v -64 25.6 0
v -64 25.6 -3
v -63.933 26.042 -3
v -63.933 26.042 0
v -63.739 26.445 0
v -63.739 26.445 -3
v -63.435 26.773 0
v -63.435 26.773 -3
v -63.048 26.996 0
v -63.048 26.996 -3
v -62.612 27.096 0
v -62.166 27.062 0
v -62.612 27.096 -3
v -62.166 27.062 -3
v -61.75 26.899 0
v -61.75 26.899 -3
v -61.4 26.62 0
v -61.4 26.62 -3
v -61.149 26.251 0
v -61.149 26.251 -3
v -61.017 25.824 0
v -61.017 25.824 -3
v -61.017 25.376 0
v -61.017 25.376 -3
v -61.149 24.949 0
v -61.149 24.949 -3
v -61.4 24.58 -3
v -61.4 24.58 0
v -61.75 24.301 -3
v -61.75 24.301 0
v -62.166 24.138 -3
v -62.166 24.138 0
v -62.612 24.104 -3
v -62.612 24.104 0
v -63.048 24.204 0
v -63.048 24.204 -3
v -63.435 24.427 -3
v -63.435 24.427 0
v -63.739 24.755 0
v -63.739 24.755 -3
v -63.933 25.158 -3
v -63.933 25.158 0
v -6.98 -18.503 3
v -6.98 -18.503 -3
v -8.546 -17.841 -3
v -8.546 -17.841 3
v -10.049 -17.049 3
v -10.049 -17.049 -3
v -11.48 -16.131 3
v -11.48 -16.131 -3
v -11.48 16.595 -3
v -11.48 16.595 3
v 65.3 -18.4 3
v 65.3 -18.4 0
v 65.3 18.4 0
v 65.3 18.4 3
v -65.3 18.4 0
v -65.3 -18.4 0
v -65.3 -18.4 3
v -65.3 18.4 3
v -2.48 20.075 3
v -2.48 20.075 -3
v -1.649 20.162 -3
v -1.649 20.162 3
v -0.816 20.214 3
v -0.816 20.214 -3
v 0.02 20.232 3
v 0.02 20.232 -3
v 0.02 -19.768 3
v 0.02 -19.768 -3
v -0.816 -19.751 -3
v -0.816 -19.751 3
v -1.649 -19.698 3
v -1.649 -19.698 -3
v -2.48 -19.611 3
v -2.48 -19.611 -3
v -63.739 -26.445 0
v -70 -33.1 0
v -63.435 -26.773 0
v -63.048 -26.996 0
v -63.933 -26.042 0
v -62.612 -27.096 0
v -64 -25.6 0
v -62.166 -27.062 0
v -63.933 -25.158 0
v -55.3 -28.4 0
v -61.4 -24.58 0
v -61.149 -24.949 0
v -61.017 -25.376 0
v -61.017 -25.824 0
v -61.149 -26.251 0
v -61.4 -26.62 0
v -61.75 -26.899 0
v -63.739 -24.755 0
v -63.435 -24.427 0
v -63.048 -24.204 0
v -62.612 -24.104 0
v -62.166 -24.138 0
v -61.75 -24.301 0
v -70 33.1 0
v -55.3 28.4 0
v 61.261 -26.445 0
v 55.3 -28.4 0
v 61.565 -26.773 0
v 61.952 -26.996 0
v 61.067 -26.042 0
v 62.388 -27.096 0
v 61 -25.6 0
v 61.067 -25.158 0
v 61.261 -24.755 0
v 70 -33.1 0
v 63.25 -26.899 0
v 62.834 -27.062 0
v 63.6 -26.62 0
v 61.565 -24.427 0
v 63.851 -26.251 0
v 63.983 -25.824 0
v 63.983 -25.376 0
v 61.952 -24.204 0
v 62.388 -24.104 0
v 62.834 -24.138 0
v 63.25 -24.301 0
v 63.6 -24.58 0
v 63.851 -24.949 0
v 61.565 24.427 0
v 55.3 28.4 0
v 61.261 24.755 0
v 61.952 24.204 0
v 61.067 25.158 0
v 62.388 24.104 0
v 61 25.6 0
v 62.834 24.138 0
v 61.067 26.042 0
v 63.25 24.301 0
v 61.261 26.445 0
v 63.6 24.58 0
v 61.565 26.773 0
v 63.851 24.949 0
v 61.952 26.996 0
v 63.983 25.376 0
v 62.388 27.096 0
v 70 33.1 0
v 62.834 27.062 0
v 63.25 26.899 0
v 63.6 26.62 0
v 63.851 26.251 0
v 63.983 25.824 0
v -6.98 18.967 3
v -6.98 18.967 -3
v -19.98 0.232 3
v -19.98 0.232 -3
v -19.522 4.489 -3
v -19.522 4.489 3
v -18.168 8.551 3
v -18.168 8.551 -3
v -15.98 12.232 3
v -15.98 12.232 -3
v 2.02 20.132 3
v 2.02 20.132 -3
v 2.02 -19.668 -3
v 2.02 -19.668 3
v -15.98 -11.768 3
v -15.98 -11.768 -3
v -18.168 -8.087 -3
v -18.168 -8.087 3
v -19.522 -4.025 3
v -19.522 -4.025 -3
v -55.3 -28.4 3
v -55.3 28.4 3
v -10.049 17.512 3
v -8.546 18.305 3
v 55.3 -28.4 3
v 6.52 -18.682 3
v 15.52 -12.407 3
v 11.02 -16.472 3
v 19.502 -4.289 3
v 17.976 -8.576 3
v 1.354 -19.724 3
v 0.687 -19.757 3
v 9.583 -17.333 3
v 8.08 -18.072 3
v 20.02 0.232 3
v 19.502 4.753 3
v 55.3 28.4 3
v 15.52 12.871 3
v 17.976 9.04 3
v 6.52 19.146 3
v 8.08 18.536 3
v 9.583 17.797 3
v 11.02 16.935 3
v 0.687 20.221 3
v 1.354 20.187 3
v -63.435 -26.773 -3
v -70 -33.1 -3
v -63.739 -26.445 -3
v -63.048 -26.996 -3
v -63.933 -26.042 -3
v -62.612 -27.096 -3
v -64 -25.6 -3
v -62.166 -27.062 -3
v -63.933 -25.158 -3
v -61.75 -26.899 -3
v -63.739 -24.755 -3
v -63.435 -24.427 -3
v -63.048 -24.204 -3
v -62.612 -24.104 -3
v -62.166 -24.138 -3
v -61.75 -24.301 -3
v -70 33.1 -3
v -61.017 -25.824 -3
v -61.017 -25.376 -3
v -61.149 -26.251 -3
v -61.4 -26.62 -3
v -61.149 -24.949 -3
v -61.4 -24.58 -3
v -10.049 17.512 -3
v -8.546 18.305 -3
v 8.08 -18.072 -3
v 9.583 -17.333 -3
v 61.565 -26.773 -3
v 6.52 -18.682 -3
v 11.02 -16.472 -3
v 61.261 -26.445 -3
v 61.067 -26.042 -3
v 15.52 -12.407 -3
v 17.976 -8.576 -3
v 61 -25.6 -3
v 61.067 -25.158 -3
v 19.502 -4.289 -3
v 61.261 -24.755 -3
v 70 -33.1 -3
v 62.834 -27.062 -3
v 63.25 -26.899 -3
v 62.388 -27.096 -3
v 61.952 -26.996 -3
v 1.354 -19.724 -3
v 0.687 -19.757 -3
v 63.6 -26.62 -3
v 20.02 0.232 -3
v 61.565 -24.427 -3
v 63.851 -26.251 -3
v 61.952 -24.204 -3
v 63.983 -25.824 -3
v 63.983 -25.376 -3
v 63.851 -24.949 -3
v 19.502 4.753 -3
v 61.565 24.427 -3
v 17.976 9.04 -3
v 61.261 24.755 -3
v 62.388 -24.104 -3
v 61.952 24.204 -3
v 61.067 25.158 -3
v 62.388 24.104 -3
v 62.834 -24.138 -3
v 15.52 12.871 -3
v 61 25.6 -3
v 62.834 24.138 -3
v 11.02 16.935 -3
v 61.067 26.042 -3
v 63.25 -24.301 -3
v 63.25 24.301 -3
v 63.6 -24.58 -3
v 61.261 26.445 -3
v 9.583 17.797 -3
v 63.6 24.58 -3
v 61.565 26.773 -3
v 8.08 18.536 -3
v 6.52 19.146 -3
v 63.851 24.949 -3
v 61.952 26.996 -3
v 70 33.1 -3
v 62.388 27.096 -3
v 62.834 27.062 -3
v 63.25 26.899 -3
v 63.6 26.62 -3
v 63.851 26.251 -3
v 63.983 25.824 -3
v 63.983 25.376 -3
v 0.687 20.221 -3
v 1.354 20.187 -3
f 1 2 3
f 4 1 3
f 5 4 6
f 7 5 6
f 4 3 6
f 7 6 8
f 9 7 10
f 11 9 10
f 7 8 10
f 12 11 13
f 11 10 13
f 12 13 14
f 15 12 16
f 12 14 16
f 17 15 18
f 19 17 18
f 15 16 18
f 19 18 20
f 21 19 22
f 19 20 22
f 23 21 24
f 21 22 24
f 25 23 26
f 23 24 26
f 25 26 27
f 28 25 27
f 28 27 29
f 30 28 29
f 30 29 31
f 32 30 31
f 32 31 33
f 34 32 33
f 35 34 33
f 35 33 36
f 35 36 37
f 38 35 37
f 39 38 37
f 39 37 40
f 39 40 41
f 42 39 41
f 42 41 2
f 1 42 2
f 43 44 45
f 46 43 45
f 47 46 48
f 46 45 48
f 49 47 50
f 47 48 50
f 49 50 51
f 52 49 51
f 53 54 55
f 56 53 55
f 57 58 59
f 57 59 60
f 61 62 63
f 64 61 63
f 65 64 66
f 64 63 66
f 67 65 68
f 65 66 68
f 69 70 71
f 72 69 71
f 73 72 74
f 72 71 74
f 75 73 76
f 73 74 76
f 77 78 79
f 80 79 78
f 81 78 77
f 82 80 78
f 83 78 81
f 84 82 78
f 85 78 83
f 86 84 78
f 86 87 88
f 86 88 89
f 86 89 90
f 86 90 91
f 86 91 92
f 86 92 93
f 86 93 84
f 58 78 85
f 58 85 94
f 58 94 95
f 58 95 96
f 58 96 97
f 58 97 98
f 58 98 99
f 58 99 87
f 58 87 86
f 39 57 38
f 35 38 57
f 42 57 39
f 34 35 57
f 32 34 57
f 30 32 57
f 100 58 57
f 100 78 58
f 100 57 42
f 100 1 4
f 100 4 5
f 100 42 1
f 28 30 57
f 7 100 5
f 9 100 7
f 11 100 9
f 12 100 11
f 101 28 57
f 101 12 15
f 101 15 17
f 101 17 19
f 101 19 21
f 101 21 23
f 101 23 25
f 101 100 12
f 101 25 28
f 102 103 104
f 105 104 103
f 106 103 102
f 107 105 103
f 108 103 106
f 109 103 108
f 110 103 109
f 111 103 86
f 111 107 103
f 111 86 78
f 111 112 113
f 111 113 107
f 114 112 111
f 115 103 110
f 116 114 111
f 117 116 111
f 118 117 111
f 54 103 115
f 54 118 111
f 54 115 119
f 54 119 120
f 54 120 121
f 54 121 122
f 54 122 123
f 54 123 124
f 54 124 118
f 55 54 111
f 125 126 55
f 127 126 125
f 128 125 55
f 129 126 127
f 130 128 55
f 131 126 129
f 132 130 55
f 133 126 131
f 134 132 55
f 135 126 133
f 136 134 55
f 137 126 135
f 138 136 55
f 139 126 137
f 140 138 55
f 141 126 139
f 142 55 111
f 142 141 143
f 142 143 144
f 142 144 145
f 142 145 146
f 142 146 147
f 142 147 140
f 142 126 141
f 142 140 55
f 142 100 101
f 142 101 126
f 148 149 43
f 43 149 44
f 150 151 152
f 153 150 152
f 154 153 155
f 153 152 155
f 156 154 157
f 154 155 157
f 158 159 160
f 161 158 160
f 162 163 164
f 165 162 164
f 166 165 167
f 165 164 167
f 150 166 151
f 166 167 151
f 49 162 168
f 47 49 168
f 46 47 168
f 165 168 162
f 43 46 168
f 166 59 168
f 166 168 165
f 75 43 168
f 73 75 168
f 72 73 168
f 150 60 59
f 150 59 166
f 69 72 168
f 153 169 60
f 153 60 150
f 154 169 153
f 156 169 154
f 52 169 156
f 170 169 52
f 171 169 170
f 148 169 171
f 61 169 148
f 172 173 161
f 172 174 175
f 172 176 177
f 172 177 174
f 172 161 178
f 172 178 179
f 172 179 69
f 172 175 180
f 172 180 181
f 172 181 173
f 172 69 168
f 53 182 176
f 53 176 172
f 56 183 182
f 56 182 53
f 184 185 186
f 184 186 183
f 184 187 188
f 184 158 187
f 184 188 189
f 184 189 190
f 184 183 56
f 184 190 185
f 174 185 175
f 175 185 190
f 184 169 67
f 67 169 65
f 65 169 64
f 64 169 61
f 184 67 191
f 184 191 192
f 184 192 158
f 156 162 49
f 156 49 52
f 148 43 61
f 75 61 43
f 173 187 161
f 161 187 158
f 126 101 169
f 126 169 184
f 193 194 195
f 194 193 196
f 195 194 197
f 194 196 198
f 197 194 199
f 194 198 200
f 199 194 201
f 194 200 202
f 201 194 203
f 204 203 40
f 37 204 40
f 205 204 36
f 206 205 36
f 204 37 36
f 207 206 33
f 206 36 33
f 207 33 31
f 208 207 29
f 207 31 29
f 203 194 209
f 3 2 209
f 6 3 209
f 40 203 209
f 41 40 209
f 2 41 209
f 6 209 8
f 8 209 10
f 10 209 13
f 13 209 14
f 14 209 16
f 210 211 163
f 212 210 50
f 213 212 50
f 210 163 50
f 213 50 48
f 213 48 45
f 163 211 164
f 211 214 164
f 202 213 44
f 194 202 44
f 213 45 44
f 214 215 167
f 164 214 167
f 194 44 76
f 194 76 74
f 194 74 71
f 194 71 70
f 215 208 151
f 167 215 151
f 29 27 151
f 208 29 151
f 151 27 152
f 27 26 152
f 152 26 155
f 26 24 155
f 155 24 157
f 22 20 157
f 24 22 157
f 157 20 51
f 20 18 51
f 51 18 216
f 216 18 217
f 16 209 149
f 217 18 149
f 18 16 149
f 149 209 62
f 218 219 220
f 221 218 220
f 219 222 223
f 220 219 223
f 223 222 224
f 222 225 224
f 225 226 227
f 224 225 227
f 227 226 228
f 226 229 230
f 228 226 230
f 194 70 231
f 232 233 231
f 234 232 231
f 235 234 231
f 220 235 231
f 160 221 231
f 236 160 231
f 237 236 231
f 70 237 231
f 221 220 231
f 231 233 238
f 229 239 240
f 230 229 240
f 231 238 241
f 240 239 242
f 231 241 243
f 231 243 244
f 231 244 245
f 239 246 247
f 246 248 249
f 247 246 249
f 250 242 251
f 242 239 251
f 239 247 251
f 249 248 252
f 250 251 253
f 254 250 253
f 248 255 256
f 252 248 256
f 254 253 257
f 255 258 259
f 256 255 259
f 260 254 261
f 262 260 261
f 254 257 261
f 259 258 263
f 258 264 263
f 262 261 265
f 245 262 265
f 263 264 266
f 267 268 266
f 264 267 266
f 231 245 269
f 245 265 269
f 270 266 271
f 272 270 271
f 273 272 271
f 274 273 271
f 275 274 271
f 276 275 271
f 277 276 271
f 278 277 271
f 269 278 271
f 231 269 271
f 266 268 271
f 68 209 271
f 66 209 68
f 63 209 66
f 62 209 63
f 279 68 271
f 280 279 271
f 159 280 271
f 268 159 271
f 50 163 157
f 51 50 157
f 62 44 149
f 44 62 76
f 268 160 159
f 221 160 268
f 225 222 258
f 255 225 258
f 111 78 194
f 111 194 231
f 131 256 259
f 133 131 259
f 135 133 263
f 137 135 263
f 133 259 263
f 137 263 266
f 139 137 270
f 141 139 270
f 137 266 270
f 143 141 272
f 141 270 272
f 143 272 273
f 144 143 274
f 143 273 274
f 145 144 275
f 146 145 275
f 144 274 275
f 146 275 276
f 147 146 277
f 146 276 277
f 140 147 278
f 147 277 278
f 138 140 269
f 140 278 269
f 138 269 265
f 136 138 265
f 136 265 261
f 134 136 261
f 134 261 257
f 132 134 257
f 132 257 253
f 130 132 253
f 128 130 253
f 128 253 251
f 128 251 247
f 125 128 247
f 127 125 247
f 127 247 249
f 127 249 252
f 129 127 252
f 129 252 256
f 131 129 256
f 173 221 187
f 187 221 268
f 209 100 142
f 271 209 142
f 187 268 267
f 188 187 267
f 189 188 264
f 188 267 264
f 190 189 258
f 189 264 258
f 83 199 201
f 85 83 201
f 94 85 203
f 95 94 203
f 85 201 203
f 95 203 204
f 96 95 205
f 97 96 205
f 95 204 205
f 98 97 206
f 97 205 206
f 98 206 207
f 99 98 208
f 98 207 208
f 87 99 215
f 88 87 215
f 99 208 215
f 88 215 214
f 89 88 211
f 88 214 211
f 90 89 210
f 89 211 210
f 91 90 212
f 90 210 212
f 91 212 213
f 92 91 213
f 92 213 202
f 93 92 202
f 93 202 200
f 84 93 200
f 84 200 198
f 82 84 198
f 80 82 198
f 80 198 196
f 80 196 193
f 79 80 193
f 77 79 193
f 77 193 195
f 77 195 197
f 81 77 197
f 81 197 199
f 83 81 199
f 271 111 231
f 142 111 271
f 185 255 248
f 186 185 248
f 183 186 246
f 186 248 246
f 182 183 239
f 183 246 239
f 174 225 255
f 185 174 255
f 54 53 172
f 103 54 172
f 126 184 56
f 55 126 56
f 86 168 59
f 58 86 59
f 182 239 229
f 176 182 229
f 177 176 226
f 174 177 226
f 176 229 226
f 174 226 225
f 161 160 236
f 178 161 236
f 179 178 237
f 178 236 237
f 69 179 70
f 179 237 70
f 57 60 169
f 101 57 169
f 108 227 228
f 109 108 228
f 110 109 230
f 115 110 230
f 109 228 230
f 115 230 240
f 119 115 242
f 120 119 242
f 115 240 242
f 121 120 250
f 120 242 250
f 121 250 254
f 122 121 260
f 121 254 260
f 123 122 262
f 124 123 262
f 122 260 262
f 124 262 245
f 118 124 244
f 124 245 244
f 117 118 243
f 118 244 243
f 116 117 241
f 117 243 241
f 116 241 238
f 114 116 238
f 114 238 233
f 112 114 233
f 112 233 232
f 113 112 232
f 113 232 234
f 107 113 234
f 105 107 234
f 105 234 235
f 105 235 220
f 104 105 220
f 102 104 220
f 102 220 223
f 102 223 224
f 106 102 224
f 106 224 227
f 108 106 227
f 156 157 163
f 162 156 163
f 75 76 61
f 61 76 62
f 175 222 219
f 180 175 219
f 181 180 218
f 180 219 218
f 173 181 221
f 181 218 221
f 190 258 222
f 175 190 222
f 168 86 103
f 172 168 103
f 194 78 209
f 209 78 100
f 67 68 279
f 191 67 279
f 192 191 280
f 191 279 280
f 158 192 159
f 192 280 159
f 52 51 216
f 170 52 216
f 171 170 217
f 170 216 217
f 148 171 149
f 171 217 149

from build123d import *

# Parameters (mm, degrees)
SKETCH2_W           = 140
SKETCH2_H           = 66.2
BOSS_EXTRUDE1_DEPTH = 3
SKETCH3_W           = 130.6
SKETCH3_H           = 56.8
BOSS_EXTRUDE2_DEPTH = 3
CUT_EXTRUDE1_DEPTH  = 7
SKETCH5_R           = 1.5
CUT_EXTRUDE2_DEPTH  = 7
CUT_EXTRUDE3_DEPTH  = 3


with BuildPart() as part:
    # Sketch2 → Boss-Extrude1 (new body)
    with BuildSketch(Plane.XY):
        Rectangle(SKETCH2_W, SKETCH2_H)
    extrude(amount=-BOSS_EXTRUDE1_DEPTH)

    # Sketch3 → Boss-Extrude2 (add)
    with BuildSketch(Plane.XY):
        Rectangle(SKETCH3_W, SKETCH3_H)
    extrude(amount=BOSS_EXTRUDE2_DEPTH)

    # Sketch4 → Cut-Extrude1 (cut, through all)
    with BuildSketch(Plane(origin=(0, 0, -3), x_dir=(-1, 0, 0), z_dir=(0, 0, -1))):
        with BuildLine():
            ThreePointArc((-15.519758089, 12.871012345), (-18.86120177, 6.939991617), (-20.019758089, 0.231787685))
            ThreePointArc((-20.019758089, 0.231787685), (-18.86120177, -6.476416248), (-15.519758089, -12.407436975))
            Line((-15.519758089, -12.407436975), (-15.519758089, 12.871012345))
        make_face()
        with BuildLine():
            ThreePointArc((-6.519758089, 19.146068004), (-8.839316816, 18.182146563), (-11.019758089, 16.935080773))
            Line((-11.019758089, 16.935080773), (-11.019758089, -16.471505404))
            ThreePointArc((-11.019758089, -16.471505404), (-8.839316816, -17.718571194), (-6.519758089, -18.682492635))
            Line((-6.519758089, -18.682492635), (-6.519758089, 19.146068004))
        make_face()
        with BuildLine():
            ThreePointArc((2.480241911, 20.074922518), (1.232700165, 20.192532869), (-0.019758083, 20.231787685))
            ThreePointArc((-0.019758083, 20.231787685), (-1.021013587, 20.206709147), (-2.019758089, 20.131536427))
            Line((-2.019758089, 20.131536427), (-2.019758089, -19.667961057))
            ThreePointArc((-2.019758089, -19.667961057), (-1.02101359, -19.743133777), (-0.019758089, -19.768212315))
            ThreePointArc((-0.019758089, -19.768212315), (1.232700162, -19.7289575), (2.480241911, -19.611347148))
            Line((2.480241911, -19.611347148), (2.480241911, 20.074922518))
        make_face()
        with BuildLine():
            ThreePointArc((11.480241911, 16.594855857), (9.305959472, 17.924469561), (6.980241911, 18.96678168))
            Line((6.980241911, 18.96678168), (6.980241911, -18.50320631))
            ThreePointArc((6.980241911, -18.50320631), (9.305959472, -17.460894191), (11.480241911, -16.131280487))
            Line((11.480241911, -16.131280487), (11.480241911, 16.594855857))
        make_face()
        with BuildLine():
            ThreePointArc((19.980241911, 0.231787685), (18.953907872, 6.556343005), (15.980241911, 12.231787685))
            Line((15.980241911, 12.231787685), (15.980241911, -11.768212315))
            ThreePointArc((15.980241911, -11.768212315), (18.953907872, -6.092767635), (19.980241911, 0.231787685))
        make_face()
    extrude(amount=-CUT_EXTRUDE1_DEPTH, mode=Mode.SUBTRACT)

    # Sketch5 → Cut-Extrude2 (cut, through all)
    with BuildSketch(Plane(origin=(0, 0, -3), x_dir=(-1, 0, 0), z_dir=(0, 0, -1))):
        with Locations((-62.5, 25.6)):
            Circle(SKETCH5_R)
        with Locations((62.5, 25.6)):
            Circle(SKETCH5_R)
        with Locations((62.5, -25.6)):
            Circle(SKETCH5_R)
        with Locations((-62.5, -25.6)):
            Circle(SKETCH5_R)
    extrude(amount=-CUT_EXTRUDE2_DEPTH, mode=Mode.SUBTRACT)

    # Sketch6 → Cut-Extrude3 (cut)
    with BuildSketch(Plane.XY.offset(3)):
        Polygon((65.3, 28.4), (55.3, 28.4), (65.3, 18.4), align=None)
        Polygon((65.3, -28.4), (65.3, -18.4), (55.3, -28.4), align=None)
        Polygon((-65.3, -28.4), (-55.3, -28.4), (-65.3, -18.4), align=None)
        Polygon((-65.3, 28.4), (-65.3, 18.4), (-55.3, 28.4), align=None)
    extrude(amount=-CUT_EXTRUDE3_DEPTH, mode=Mode.SUBTRACT)


solid = part.part
